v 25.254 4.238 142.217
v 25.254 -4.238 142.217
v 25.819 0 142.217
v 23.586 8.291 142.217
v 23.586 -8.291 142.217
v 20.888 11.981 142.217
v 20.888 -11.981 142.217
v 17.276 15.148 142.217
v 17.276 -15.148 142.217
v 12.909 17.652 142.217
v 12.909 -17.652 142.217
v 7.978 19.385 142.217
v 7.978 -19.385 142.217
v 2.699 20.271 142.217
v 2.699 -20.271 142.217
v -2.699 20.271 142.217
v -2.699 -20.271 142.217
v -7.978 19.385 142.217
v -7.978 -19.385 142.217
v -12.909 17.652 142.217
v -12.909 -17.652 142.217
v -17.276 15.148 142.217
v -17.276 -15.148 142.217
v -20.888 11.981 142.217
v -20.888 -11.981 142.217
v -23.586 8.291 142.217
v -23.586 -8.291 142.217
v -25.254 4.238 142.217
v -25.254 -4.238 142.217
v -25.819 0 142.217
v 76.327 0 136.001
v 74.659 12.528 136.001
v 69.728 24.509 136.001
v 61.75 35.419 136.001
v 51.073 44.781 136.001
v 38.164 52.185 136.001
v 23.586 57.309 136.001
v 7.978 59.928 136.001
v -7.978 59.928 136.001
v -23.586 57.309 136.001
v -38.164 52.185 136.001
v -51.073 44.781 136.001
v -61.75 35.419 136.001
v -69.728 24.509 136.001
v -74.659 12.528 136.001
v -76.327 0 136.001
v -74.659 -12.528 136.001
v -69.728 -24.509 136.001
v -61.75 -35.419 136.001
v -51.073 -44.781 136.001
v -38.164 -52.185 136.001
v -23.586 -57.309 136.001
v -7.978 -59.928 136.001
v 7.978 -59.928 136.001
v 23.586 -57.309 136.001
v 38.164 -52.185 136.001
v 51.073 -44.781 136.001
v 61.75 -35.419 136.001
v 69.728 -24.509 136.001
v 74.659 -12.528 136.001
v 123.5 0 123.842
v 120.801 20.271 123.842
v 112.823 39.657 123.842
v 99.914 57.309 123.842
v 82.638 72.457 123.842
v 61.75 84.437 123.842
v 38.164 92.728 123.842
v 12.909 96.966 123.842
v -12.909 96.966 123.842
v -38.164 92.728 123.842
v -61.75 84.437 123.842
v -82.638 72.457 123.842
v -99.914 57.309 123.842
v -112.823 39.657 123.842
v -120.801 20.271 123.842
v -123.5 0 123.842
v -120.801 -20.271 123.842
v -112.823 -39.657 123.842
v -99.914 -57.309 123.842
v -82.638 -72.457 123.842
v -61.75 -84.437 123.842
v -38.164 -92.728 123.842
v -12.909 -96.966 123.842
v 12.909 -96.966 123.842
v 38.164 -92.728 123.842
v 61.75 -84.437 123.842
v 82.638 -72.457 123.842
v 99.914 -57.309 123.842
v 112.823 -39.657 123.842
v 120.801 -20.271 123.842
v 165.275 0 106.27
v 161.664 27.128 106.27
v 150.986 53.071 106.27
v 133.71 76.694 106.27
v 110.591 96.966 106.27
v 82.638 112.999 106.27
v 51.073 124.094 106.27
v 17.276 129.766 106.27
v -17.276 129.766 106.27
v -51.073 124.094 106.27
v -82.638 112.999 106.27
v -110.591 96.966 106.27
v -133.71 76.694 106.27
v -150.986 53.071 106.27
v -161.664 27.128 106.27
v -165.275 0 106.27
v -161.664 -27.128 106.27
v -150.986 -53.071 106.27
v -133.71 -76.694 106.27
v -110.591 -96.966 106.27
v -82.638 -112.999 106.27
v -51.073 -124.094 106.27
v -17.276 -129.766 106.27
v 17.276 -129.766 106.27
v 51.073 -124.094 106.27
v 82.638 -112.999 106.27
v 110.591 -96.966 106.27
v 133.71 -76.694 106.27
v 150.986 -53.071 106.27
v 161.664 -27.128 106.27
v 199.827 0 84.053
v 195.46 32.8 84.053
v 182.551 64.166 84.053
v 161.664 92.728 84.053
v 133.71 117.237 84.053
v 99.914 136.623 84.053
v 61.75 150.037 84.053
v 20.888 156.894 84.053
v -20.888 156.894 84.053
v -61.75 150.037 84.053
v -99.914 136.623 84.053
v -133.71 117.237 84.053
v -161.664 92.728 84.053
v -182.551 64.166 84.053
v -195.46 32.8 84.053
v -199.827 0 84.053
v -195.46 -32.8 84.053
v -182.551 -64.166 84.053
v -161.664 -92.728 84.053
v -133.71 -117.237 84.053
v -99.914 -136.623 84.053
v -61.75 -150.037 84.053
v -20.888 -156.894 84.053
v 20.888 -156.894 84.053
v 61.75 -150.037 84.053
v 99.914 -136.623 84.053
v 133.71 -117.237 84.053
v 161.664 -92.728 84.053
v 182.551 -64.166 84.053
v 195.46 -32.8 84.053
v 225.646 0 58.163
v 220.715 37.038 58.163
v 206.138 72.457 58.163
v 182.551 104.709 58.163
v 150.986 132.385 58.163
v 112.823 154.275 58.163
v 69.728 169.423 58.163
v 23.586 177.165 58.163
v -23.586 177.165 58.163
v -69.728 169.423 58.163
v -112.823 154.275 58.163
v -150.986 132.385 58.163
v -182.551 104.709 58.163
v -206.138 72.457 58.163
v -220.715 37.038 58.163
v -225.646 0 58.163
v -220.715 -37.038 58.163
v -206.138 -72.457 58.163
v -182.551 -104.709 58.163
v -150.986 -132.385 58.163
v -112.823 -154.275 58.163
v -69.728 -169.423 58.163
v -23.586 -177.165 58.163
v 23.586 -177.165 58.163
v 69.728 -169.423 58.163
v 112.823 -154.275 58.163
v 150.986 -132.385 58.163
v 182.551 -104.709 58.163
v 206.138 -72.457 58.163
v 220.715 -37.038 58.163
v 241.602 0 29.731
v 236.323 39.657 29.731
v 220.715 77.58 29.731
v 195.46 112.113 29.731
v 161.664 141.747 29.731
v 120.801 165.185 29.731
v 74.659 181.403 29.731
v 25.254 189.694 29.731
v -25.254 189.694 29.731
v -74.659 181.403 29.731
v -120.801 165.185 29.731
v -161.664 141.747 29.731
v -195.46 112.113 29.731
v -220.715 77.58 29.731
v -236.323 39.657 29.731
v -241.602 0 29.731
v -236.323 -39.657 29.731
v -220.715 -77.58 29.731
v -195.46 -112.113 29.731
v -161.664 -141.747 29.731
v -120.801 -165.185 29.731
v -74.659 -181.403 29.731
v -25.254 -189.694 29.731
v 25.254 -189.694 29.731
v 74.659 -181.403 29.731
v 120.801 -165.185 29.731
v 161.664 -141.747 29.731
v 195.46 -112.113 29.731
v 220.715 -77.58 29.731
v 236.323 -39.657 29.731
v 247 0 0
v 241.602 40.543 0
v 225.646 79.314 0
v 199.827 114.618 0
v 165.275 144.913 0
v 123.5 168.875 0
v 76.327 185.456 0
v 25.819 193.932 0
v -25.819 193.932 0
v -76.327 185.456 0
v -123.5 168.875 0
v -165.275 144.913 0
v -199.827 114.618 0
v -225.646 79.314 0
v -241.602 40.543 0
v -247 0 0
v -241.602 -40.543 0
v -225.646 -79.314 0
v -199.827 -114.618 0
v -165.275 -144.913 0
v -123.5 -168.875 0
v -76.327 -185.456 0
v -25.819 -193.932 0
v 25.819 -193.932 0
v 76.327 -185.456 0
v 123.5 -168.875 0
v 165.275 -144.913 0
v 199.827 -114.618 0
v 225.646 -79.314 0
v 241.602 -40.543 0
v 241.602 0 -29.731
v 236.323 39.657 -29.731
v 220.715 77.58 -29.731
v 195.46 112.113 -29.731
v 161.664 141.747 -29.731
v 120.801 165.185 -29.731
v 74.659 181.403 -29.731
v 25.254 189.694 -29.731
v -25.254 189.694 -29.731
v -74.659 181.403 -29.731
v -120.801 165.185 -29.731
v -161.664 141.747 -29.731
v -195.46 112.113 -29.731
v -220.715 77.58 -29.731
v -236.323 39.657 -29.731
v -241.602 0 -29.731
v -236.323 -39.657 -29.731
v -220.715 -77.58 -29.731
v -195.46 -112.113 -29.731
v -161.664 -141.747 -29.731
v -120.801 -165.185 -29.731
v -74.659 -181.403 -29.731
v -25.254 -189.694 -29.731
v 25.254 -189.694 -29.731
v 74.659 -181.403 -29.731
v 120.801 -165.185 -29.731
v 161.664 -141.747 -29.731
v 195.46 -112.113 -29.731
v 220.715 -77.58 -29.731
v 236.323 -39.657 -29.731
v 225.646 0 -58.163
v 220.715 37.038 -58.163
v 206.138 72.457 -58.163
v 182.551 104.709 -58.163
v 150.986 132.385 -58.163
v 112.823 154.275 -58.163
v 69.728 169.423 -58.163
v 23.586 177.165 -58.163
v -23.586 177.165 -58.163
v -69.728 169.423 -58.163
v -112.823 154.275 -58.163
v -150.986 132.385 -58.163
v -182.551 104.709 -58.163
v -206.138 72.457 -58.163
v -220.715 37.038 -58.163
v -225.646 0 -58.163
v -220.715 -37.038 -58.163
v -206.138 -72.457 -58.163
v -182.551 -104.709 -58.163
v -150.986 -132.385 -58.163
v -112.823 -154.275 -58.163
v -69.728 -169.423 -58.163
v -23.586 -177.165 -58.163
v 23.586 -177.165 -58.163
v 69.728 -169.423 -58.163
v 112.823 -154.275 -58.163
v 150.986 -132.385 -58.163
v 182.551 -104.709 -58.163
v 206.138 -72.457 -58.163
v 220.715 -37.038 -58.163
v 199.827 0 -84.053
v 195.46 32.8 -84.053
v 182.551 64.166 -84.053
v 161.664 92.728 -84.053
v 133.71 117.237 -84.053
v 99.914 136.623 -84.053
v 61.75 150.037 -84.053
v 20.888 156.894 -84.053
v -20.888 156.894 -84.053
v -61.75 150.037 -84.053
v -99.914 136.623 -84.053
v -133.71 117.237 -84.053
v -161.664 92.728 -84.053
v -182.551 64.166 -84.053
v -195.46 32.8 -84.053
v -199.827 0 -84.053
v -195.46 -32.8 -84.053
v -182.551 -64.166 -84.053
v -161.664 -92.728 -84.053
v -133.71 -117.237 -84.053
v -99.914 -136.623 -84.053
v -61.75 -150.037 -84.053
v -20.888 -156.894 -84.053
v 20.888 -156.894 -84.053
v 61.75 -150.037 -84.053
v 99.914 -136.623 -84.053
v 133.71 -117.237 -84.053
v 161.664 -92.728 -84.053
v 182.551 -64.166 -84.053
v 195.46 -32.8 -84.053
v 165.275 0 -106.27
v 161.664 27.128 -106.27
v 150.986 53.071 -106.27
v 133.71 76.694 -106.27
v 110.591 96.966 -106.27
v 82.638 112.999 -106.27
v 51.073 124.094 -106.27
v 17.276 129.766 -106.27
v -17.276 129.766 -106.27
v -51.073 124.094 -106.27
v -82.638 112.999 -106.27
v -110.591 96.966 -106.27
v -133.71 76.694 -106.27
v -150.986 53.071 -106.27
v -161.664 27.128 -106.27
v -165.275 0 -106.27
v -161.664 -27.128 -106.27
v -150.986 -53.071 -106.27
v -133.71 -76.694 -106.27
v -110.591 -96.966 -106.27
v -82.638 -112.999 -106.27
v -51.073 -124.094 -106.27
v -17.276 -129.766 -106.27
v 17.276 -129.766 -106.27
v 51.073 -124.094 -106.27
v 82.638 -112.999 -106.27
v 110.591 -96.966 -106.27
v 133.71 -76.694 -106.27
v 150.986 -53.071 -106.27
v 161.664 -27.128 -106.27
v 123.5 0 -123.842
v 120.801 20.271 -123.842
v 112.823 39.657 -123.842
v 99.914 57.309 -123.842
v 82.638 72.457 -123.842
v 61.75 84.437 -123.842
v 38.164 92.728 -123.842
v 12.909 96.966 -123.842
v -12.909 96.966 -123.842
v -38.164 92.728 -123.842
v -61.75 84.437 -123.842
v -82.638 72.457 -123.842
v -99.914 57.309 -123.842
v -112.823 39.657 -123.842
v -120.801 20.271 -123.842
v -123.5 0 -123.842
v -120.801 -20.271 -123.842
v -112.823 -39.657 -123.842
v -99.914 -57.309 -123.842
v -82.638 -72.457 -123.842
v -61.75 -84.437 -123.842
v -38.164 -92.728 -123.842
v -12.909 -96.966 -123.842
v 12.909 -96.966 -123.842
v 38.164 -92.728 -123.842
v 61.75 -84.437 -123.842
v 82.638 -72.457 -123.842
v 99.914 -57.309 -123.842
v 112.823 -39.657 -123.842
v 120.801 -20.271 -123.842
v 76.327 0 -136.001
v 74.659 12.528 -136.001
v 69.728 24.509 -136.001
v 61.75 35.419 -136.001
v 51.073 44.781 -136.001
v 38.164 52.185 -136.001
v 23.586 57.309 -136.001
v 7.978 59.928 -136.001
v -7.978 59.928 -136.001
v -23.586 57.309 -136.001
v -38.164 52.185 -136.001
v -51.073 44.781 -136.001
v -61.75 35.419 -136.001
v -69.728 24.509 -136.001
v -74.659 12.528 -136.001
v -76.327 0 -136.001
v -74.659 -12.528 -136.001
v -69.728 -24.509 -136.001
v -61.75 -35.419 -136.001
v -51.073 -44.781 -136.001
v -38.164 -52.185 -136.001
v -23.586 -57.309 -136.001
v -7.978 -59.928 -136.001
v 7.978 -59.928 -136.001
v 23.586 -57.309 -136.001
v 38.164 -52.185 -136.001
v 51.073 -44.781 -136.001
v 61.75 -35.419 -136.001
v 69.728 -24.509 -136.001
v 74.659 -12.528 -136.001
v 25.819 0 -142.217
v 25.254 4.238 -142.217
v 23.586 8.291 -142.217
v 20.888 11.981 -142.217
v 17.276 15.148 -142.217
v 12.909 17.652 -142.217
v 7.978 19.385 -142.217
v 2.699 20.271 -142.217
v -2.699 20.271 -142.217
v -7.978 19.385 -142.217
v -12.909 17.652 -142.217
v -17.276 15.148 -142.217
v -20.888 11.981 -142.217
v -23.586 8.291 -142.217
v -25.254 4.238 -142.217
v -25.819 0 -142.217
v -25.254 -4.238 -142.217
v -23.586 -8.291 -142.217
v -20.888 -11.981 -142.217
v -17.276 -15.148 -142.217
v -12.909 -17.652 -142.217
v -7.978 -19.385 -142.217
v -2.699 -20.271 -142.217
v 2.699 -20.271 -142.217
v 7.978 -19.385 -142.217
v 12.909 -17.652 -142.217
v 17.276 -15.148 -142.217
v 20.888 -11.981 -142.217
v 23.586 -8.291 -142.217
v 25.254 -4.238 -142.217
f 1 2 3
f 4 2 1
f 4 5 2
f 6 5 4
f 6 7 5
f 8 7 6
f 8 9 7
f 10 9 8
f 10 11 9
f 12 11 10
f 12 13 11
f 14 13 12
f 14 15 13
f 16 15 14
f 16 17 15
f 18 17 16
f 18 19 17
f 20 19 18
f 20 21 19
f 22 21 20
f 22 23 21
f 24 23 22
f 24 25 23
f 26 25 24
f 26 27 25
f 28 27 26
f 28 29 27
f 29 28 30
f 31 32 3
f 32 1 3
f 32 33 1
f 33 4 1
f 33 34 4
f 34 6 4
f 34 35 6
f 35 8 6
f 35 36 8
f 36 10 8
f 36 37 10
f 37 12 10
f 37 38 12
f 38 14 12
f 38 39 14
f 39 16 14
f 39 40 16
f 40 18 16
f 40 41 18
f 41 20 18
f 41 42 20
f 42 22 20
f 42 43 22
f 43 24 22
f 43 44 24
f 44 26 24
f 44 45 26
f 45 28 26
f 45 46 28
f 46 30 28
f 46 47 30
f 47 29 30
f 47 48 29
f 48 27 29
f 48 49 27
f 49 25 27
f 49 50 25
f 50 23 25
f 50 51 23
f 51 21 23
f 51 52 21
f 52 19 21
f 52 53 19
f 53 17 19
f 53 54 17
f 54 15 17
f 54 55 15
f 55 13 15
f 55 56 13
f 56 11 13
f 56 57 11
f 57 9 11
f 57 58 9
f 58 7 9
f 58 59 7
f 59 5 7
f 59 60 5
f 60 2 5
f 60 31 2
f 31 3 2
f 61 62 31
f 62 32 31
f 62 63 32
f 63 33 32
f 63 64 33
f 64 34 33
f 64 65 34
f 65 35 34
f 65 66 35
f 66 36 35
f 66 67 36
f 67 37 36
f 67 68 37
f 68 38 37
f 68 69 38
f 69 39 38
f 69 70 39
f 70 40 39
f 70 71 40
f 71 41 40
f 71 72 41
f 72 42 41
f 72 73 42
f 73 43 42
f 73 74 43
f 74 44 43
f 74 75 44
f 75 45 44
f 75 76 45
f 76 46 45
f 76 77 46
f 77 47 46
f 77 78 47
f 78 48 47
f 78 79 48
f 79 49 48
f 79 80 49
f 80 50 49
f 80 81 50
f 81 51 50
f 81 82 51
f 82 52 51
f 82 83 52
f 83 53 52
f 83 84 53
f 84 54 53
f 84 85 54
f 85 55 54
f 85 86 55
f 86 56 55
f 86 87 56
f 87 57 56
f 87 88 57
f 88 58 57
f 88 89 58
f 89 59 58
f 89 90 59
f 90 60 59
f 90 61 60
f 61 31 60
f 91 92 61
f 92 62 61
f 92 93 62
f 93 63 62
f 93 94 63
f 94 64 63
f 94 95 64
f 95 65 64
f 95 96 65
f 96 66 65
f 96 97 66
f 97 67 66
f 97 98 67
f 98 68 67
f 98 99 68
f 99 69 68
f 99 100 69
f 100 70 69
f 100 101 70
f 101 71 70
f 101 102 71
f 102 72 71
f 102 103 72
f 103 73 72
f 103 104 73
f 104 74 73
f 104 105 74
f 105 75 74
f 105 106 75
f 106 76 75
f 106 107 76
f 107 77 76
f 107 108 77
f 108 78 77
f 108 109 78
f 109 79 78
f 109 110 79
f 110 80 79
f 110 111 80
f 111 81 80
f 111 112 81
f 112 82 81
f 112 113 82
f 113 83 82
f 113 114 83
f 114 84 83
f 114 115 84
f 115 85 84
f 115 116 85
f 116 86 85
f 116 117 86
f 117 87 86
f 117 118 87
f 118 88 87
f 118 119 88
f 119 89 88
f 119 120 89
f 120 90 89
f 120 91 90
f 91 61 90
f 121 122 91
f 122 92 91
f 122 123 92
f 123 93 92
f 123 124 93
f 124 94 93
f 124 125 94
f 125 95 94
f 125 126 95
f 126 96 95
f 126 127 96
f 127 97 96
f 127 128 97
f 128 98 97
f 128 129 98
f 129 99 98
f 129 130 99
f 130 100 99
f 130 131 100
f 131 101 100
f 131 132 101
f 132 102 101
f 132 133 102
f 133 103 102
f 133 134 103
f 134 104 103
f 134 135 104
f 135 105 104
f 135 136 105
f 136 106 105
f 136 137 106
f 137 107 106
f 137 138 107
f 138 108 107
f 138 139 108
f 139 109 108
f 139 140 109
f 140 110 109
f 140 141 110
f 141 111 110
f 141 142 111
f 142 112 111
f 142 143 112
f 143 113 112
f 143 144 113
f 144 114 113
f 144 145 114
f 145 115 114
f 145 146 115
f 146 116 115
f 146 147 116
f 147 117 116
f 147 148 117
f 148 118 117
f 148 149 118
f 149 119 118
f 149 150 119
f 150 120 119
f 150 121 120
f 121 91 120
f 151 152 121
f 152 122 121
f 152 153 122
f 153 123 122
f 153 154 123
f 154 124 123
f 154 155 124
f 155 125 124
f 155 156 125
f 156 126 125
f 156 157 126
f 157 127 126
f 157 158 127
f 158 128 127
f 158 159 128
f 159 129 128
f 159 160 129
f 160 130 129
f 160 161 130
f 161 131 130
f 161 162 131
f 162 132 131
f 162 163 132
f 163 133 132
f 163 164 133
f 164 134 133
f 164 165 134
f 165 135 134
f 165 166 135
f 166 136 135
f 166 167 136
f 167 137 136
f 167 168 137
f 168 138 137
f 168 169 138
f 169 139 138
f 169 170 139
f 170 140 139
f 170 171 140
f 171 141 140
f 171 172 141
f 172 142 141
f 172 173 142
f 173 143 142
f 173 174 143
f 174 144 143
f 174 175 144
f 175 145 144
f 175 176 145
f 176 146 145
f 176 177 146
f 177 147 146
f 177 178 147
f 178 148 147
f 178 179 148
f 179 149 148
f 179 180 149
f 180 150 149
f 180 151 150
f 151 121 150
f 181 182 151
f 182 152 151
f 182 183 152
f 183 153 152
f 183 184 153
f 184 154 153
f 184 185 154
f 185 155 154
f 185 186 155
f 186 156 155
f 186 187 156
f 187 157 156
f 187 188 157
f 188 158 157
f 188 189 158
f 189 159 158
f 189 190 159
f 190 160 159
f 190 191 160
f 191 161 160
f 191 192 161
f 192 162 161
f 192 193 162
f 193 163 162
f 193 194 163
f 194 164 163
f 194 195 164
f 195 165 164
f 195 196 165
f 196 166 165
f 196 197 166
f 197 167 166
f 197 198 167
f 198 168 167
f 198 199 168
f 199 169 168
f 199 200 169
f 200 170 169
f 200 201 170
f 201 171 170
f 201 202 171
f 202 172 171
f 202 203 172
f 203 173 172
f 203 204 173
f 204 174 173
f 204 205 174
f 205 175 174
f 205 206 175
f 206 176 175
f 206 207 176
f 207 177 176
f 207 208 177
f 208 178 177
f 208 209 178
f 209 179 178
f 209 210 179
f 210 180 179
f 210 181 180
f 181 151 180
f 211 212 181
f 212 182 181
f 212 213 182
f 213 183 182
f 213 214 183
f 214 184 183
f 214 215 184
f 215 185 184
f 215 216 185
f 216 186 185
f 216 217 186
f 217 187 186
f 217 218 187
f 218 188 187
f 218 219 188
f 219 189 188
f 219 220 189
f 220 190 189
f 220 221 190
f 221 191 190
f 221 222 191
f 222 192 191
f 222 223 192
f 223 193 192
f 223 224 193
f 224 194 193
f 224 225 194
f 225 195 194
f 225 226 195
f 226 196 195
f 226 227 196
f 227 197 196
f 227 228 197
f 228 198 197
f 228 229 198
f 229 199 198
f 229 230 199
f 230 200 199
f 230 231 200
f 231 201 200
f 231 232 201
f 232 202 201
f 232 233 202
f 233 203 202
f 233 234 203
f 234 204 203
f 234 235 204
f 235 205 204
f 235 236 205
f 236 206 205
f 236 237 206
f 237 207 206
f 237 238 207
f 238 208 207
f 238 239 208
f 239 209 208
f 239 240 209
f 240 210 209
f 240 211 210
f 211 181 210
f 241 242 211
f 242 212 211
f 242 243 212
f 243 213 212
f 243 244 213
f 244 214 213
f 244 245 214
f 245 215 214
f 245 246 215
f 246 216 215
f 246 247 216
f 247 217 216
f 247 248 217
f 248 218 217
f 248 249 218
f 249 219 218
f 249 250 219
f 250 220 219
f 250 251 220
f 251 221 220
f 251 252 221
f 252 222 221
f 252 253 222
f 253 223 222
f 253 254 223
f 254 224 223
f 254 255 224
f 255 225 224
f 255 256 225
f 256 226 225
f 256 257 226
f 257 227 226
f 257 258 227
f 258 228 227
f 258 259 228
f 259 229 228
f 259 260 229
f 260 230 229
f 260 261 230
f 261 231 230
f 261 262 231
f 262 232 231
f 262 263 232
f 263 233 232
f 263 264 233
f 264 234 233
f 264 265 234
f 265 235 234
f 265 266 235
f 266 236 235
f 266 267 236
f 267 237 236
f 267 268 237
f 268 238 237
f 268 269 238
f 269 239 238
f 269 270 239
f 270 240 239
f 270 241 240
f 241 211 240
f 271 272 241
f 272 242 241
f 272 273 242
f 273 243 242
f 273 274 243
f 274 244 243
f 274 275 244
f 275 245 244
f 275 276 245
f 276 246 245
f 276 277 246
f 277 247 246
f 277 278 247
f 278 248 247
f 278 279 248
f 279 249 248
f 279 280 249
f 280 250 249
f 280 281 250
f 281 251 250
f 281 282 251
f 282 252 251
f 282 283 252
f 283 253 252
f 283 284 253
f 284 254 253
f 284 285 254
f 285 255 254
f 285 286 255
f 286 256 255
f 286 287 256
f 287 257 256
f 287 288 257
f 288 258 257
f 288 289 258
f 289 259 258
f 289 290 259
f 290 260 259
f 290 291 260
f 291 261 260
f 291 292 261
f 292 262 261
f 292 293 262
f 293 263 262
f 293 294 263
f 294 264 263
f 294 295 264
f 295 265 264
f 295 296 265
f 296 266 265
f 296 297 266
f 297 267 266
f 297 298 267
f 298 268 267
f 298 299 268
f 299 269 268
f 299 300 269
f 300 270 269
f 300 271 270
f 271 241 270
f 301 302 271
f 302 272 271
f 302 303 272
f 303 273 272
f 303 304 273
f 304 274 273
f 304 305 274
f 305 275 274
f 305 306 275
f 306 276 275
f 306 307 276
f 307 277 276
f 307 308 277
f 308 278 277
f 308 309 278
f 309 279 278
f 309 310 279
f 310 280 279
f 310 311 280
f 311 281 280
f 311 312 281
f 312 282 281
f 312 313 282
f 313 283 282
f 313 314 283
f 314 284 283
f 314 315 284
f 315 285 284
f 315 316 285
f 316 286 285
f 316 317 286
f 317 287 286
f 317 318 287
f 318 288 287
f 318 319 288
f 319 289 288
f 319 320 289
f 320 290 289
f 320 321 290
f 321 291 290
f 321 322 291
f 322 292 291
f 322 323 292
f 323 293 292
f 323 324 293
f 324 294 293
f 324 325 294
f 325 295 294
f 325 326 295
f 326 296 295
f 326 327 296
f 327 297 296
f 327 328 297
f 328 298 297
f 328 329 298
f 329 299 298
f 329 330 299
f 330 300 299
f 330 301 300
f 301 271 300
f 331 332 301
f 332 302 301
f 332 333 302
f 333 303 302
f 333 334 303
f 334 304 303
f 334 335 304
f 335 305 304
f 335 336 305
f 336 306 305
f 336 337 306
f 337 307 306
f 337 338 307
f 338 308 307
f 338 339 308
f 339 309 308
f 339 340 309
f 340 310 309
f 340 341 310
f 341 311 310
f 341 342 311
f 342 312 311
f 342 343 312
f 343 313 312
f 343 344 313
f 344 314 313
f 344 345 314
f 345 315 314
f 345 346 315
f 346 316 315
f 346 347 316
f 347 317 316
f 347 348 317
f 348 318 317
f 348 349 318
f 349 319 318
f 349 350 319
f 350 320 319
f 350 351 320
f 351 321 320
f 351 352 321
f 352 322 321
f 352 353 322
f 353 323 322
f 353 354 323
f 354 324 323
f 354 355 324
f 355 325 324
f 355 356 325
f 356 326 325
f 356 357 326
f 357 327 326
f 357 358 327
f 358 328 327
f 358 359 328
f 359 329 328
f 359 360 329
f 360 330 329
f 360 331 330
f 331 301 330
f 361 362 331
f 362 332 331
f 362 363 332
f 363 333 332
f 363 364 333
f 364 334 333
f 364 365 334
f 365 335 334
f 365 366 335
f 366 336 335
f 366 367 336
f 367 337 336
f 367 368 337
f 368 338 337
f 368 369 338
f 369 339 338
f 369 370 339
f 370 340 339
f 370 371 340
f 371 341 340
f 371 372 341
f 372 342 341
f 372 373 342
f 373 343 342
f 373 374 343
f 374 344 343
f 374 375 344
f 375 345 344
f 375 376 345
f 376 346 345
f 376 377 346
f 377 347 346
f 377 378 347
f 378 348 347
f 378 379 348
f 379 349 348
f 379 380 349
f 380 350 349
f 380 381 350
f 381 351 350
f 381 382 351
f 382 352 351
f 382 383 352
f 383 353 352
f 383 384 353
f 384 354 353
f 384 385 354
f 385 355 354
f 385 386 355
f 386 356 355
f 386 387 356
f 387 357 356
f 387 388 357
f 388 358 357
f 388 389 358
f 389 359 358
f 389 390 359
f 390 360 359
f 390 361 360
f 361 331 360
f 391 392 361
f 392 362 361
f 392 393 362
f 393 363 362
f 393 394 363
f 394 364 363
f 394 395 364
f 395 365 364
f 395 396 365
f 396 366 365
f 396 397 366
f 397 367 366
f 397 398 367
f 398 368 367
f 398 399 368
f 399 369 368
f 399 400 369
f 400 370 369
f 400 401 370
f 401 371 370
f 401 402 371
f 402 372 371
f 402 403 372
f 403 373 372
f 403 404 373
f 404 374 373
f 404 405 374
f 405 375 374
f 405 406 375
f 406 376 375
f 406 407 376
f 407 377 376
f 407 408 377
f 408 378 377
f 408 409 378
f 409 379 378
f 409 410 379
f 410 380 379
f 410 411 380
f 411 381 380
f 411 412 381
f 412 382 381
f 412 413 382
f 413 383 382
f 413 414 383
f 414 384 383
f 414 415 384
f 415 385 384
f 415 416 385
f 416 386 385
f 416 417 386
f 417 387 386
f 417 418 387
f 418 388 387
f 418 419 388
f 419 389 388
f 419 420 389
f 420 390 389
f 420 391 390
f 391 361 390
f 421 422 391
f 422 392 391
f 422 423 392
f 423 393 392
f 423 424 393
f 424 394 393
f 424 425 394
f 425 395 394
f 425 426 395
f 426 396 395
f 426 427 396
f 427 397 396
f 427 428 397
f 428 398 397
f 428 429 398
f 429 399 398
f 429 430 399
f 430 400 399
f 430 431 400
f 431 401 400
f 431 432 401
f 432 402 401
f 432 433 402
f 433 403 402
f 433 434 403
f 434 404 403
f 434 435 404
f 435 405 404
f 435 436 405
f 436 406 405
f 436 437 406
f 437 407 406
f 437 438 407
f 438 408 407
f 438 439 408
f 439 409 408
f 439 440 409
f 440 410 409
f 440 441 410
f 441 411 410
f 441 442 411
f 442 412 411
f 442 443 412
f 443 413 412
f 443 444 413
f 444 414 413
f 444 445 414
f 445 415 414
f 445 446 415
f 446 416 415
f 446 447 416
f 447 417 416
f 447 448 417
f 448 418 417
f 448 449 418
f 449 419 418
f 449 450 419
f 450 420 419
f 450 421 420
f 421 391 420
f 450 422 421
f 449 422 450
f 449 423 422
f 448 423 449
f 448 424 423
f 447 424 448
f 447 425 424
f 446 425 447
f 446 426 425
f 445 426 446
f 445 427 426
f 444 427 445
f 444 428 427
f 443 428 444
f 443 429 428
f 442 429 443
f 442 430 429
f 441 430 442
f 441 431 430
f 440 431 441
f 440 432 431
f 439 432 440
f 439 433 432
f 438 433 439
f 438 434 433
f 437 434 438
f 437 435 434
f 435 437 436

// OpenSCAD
// Generated by SolidPython 1.0.1 on 2020-07-29 00:46:54


scale(v = [19, 15, 11]) {
	sphere(r = 13);
}
/***********************************************
*********      SolidPython code:      **********
************************************************
 
# import packages: SolidPython
from solid import *
from solid.utils import *
from itertools import chain, combinations, permutations


class Resize:

    def __init__(self, scad_file):
        self.scad_file = scad_file
        #self.scad_file = import_scad(scad_file)
        # cone/cylinder param:
        self.r1 = 0
        self.r2 = 0
        self.h = 0
        # rectangular prism param:
        self.w = 0
        self.l = 0
        # ellipse param:
        self.r = 0

    # import OpenScad code (file name corresponds to shape)


    # classify shape + parameters
    def assign(self, param1, param2, param3):
        if self.scad_file == 'cone.scad':
            self.r1 = param1
            self.r2 = param2
            self.h = param3
        elif self.scad_file == 'cylinder.scad':
            self.r1 = param1
            self.r2 = param2
            self.h = param3
        elif self.scad_file == 'rectangularPrism.scad':
            self.h = param1
            self.l = param2
            self.w = param3
        else:
            self.r = param1
            self.h = param2

    # resize parameters
    def iterate(self):
        x = range(3, 20, 2)
        i = 1
        if self.scad_file == 'cone.scad':
            tempList = list(permutations(x, 2))
            for temp in tempList:
                param1 = temp[0]
                param2 = temp[1]
                filepath = 'produced_scad_files/' + 'cone' + str(param1) + '_' + str(param2) + '_' + '.scad'
                scad_render_to_file(cylinder(h=param1, r1=param2, r2=0), filepath)

        elif self.scad_file == 'cylinder.scad':
            tempList = list(permutations(x, 3))
            for temp in tempList:
                param1 = temp[0]
                param2 = temp[1]
                filepath = 'produced_scad_files/' + 'cylinder' + str(param1) + '_' + str(param2) + '_' + '.scad'
                scad_render_to_file(cylinder(h=param1, r1=param2, r2=param2), filepath)

        elif self.scad_file == 'rectangularPrism.scad':
            tempList = list(permutations(x, 3))
            for temp in tempList:
                param1 = temp[0]
                param2 = temp[1]
                param3 = temp[2]
                filepath = 'produced_scad_files/' + 'rectangularPrism' + str(param1) + '_' + str(param2) + '_' + str(
                    param3) + '.scad'
                scad_render_to_file(cube(size=(param1, param2, param3)), filepath)

        elif self.scad_file == 'ellipse.scad':
            tempList = list(permutations(x, 4))
            for temp in tempList:
                param1 = temp[0]
                param2 = temp[1]
                param3 = temp[2]
                param4 = temp[3]
                filepath = 'produced_scad_files/' + 'ellipse' + str(param1) + '_' + str(param2) + '_' + str(param3) + '_' + str(param4) + '.scad'
                scad_render_to_file(scale([param1, param2, param3])(sphere(r=param4)), filepath)

    def render_to_scadfile(self):
        scad_render_to_file(scad, 'example.scad') 
 
************************************************/
